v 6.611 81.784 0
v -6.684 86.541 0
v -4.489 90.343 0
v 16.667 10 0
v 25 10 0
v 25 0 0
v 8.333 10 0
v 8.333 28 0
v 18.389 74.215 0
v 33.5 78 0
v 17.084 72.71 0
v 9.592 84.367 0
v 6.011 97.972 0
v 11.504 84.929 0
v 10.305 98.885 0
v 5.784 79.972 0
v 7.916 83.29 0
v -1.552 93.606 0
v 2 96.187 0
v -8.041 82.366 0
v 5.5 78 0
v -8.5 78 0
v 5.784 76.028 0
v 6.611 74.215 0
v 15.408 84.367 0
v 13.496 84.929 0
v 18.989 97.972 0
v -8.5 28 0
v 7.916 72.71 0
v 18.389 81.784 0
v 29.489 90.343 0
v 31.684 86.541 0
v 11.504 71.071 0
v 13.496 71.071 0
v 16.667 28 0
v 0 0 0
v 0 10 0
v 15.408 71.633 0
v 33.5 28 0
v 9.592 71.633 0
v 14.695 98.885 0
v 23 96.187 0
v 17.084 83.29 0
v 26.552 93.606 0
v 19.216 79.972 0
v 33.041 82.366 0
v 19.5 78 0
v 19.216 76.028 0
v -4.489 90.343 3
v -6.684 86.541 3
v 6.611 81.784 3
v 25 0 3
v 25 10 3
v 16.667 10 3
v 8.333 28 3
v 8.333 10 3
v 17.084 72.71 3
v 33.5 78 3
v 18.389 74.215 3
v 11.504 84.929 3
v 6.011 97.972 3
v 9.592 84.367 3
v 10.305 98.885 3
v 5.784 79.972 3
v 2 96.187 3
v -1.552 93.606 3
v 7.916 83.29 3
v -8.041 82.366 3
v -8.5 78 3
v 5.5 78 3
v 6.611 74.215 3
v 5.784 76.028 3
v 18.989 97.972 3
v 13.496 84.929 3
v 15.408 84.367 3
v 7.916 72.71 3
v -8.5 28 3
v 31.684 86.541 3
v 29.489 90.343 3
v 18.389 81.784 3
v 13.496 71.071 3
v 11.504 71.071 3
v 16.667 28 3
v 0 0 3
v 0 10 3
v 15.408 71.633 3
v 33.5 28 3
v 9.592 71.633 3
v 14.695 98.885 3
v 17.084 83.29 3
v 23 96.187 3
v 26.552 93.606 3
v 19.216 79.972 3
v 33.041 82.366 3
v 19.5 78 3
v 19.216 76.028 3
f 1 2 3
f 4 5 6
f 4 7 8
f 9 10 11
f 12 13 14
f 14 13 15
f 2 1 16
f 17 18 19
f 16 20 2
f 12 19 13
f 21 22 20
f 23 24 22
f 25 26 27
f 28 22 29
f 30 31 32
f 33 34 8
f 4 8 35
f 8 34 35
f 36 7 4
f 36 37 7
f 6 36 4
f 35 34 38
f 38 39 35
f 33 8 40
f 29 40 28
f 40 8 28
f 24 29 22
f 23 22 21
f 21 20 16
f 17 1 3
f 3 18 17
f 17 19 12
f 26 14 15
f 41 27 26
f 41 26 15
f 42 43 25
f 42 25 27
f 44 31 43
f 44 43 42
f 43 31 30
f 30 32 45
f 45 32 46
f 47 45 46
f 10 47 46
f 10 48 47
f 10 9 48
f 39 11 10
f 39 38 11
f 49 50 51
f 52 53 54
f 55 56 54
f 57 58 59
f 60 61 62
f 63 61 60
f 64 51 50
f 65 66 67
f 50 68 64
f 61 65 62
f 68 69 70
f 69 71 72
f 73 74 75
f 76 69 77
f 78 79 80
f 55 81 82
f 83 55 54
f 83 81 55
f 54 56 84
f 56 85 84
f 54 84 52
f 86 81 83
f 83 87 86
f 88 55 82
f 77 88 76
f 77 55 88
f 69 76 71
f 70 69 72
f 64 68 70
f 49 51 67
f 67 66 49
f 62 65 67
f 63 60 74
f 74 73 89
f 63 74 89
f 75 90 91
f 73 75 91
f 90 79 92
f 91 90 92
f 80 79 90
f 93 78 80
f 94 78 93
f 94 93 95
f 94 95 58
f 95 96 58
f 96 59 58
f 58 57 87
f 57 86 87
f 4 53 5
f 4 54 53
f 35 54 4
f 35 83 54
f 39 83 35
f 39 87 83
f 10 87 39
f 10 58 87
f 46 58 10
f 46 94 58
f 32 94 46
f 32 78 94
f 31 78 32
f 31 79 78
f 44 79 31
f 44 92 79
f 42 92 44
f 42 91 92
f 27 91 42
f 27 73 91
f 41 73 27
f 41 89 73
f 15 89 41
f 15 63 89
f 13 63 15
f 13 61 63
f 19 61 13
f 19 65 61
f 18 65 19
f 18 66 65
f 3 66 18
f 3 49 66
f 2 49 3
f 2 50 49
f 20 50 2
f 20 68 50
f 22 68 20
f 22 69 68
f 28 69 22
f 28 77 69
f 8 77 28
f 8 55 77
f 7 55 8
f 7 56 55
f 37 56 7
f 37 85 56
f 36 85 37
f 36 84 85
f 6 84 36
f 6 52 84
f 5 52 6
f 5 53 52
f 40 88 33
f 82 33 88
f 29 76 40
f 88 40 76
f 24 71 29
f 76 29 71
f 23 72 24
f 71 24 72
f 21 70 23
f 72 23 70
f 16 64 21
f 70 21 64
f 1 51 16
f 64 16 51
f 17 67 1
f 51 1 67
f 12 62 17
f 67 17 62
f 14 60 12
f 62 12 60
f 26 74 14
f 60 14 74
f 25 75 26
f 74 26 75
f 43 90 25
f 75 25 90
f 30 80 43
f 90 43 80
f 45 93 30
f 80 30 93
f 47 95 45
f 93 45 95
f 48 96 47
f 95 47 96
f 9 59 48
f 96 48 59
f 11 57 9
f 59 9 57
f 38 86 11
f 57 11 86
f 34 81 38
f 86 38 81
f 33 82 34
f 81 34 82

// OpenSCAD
//T-slot cleaner for CNC, parametric
// MakerSpaceLeiden 2017 Lucas

THICKNESS = 3 ;
SLOTWIDTH = 25;
SLOTDEPTH = 10;
EXTENSION = 18;
HANDLELEN = 50;
HANDLEWID = 42;

HOLEDIA = HANDLEWID/3;

linear_extrude(THICKNESS)
difference(){
union(){
square([SLOTWIDTH,SLOTDEPTH]);
translate([SLOTWIDTH/2-0.5*SLOTWIDTH/3,SLOTDEPTH]) square([SLOTWIDTH/3,EXTENSION]);
translate([SLOTWIDTH/2-0.5*HANDLEWID,SLOTDEPTH+EXTENSION]) square([HANDLEWID,HANDLELEN]);
translate([SLOTWIDTH/2,SLOTDEPTH+EXTENSION+HANDLELEN]) circle(d=HANDLEWID);
}
translate([SLOTWIDTH/2,SLOTDEPTH+EXTENSION+HANDLELEN]) circle(d=HOLEDIA);
}
